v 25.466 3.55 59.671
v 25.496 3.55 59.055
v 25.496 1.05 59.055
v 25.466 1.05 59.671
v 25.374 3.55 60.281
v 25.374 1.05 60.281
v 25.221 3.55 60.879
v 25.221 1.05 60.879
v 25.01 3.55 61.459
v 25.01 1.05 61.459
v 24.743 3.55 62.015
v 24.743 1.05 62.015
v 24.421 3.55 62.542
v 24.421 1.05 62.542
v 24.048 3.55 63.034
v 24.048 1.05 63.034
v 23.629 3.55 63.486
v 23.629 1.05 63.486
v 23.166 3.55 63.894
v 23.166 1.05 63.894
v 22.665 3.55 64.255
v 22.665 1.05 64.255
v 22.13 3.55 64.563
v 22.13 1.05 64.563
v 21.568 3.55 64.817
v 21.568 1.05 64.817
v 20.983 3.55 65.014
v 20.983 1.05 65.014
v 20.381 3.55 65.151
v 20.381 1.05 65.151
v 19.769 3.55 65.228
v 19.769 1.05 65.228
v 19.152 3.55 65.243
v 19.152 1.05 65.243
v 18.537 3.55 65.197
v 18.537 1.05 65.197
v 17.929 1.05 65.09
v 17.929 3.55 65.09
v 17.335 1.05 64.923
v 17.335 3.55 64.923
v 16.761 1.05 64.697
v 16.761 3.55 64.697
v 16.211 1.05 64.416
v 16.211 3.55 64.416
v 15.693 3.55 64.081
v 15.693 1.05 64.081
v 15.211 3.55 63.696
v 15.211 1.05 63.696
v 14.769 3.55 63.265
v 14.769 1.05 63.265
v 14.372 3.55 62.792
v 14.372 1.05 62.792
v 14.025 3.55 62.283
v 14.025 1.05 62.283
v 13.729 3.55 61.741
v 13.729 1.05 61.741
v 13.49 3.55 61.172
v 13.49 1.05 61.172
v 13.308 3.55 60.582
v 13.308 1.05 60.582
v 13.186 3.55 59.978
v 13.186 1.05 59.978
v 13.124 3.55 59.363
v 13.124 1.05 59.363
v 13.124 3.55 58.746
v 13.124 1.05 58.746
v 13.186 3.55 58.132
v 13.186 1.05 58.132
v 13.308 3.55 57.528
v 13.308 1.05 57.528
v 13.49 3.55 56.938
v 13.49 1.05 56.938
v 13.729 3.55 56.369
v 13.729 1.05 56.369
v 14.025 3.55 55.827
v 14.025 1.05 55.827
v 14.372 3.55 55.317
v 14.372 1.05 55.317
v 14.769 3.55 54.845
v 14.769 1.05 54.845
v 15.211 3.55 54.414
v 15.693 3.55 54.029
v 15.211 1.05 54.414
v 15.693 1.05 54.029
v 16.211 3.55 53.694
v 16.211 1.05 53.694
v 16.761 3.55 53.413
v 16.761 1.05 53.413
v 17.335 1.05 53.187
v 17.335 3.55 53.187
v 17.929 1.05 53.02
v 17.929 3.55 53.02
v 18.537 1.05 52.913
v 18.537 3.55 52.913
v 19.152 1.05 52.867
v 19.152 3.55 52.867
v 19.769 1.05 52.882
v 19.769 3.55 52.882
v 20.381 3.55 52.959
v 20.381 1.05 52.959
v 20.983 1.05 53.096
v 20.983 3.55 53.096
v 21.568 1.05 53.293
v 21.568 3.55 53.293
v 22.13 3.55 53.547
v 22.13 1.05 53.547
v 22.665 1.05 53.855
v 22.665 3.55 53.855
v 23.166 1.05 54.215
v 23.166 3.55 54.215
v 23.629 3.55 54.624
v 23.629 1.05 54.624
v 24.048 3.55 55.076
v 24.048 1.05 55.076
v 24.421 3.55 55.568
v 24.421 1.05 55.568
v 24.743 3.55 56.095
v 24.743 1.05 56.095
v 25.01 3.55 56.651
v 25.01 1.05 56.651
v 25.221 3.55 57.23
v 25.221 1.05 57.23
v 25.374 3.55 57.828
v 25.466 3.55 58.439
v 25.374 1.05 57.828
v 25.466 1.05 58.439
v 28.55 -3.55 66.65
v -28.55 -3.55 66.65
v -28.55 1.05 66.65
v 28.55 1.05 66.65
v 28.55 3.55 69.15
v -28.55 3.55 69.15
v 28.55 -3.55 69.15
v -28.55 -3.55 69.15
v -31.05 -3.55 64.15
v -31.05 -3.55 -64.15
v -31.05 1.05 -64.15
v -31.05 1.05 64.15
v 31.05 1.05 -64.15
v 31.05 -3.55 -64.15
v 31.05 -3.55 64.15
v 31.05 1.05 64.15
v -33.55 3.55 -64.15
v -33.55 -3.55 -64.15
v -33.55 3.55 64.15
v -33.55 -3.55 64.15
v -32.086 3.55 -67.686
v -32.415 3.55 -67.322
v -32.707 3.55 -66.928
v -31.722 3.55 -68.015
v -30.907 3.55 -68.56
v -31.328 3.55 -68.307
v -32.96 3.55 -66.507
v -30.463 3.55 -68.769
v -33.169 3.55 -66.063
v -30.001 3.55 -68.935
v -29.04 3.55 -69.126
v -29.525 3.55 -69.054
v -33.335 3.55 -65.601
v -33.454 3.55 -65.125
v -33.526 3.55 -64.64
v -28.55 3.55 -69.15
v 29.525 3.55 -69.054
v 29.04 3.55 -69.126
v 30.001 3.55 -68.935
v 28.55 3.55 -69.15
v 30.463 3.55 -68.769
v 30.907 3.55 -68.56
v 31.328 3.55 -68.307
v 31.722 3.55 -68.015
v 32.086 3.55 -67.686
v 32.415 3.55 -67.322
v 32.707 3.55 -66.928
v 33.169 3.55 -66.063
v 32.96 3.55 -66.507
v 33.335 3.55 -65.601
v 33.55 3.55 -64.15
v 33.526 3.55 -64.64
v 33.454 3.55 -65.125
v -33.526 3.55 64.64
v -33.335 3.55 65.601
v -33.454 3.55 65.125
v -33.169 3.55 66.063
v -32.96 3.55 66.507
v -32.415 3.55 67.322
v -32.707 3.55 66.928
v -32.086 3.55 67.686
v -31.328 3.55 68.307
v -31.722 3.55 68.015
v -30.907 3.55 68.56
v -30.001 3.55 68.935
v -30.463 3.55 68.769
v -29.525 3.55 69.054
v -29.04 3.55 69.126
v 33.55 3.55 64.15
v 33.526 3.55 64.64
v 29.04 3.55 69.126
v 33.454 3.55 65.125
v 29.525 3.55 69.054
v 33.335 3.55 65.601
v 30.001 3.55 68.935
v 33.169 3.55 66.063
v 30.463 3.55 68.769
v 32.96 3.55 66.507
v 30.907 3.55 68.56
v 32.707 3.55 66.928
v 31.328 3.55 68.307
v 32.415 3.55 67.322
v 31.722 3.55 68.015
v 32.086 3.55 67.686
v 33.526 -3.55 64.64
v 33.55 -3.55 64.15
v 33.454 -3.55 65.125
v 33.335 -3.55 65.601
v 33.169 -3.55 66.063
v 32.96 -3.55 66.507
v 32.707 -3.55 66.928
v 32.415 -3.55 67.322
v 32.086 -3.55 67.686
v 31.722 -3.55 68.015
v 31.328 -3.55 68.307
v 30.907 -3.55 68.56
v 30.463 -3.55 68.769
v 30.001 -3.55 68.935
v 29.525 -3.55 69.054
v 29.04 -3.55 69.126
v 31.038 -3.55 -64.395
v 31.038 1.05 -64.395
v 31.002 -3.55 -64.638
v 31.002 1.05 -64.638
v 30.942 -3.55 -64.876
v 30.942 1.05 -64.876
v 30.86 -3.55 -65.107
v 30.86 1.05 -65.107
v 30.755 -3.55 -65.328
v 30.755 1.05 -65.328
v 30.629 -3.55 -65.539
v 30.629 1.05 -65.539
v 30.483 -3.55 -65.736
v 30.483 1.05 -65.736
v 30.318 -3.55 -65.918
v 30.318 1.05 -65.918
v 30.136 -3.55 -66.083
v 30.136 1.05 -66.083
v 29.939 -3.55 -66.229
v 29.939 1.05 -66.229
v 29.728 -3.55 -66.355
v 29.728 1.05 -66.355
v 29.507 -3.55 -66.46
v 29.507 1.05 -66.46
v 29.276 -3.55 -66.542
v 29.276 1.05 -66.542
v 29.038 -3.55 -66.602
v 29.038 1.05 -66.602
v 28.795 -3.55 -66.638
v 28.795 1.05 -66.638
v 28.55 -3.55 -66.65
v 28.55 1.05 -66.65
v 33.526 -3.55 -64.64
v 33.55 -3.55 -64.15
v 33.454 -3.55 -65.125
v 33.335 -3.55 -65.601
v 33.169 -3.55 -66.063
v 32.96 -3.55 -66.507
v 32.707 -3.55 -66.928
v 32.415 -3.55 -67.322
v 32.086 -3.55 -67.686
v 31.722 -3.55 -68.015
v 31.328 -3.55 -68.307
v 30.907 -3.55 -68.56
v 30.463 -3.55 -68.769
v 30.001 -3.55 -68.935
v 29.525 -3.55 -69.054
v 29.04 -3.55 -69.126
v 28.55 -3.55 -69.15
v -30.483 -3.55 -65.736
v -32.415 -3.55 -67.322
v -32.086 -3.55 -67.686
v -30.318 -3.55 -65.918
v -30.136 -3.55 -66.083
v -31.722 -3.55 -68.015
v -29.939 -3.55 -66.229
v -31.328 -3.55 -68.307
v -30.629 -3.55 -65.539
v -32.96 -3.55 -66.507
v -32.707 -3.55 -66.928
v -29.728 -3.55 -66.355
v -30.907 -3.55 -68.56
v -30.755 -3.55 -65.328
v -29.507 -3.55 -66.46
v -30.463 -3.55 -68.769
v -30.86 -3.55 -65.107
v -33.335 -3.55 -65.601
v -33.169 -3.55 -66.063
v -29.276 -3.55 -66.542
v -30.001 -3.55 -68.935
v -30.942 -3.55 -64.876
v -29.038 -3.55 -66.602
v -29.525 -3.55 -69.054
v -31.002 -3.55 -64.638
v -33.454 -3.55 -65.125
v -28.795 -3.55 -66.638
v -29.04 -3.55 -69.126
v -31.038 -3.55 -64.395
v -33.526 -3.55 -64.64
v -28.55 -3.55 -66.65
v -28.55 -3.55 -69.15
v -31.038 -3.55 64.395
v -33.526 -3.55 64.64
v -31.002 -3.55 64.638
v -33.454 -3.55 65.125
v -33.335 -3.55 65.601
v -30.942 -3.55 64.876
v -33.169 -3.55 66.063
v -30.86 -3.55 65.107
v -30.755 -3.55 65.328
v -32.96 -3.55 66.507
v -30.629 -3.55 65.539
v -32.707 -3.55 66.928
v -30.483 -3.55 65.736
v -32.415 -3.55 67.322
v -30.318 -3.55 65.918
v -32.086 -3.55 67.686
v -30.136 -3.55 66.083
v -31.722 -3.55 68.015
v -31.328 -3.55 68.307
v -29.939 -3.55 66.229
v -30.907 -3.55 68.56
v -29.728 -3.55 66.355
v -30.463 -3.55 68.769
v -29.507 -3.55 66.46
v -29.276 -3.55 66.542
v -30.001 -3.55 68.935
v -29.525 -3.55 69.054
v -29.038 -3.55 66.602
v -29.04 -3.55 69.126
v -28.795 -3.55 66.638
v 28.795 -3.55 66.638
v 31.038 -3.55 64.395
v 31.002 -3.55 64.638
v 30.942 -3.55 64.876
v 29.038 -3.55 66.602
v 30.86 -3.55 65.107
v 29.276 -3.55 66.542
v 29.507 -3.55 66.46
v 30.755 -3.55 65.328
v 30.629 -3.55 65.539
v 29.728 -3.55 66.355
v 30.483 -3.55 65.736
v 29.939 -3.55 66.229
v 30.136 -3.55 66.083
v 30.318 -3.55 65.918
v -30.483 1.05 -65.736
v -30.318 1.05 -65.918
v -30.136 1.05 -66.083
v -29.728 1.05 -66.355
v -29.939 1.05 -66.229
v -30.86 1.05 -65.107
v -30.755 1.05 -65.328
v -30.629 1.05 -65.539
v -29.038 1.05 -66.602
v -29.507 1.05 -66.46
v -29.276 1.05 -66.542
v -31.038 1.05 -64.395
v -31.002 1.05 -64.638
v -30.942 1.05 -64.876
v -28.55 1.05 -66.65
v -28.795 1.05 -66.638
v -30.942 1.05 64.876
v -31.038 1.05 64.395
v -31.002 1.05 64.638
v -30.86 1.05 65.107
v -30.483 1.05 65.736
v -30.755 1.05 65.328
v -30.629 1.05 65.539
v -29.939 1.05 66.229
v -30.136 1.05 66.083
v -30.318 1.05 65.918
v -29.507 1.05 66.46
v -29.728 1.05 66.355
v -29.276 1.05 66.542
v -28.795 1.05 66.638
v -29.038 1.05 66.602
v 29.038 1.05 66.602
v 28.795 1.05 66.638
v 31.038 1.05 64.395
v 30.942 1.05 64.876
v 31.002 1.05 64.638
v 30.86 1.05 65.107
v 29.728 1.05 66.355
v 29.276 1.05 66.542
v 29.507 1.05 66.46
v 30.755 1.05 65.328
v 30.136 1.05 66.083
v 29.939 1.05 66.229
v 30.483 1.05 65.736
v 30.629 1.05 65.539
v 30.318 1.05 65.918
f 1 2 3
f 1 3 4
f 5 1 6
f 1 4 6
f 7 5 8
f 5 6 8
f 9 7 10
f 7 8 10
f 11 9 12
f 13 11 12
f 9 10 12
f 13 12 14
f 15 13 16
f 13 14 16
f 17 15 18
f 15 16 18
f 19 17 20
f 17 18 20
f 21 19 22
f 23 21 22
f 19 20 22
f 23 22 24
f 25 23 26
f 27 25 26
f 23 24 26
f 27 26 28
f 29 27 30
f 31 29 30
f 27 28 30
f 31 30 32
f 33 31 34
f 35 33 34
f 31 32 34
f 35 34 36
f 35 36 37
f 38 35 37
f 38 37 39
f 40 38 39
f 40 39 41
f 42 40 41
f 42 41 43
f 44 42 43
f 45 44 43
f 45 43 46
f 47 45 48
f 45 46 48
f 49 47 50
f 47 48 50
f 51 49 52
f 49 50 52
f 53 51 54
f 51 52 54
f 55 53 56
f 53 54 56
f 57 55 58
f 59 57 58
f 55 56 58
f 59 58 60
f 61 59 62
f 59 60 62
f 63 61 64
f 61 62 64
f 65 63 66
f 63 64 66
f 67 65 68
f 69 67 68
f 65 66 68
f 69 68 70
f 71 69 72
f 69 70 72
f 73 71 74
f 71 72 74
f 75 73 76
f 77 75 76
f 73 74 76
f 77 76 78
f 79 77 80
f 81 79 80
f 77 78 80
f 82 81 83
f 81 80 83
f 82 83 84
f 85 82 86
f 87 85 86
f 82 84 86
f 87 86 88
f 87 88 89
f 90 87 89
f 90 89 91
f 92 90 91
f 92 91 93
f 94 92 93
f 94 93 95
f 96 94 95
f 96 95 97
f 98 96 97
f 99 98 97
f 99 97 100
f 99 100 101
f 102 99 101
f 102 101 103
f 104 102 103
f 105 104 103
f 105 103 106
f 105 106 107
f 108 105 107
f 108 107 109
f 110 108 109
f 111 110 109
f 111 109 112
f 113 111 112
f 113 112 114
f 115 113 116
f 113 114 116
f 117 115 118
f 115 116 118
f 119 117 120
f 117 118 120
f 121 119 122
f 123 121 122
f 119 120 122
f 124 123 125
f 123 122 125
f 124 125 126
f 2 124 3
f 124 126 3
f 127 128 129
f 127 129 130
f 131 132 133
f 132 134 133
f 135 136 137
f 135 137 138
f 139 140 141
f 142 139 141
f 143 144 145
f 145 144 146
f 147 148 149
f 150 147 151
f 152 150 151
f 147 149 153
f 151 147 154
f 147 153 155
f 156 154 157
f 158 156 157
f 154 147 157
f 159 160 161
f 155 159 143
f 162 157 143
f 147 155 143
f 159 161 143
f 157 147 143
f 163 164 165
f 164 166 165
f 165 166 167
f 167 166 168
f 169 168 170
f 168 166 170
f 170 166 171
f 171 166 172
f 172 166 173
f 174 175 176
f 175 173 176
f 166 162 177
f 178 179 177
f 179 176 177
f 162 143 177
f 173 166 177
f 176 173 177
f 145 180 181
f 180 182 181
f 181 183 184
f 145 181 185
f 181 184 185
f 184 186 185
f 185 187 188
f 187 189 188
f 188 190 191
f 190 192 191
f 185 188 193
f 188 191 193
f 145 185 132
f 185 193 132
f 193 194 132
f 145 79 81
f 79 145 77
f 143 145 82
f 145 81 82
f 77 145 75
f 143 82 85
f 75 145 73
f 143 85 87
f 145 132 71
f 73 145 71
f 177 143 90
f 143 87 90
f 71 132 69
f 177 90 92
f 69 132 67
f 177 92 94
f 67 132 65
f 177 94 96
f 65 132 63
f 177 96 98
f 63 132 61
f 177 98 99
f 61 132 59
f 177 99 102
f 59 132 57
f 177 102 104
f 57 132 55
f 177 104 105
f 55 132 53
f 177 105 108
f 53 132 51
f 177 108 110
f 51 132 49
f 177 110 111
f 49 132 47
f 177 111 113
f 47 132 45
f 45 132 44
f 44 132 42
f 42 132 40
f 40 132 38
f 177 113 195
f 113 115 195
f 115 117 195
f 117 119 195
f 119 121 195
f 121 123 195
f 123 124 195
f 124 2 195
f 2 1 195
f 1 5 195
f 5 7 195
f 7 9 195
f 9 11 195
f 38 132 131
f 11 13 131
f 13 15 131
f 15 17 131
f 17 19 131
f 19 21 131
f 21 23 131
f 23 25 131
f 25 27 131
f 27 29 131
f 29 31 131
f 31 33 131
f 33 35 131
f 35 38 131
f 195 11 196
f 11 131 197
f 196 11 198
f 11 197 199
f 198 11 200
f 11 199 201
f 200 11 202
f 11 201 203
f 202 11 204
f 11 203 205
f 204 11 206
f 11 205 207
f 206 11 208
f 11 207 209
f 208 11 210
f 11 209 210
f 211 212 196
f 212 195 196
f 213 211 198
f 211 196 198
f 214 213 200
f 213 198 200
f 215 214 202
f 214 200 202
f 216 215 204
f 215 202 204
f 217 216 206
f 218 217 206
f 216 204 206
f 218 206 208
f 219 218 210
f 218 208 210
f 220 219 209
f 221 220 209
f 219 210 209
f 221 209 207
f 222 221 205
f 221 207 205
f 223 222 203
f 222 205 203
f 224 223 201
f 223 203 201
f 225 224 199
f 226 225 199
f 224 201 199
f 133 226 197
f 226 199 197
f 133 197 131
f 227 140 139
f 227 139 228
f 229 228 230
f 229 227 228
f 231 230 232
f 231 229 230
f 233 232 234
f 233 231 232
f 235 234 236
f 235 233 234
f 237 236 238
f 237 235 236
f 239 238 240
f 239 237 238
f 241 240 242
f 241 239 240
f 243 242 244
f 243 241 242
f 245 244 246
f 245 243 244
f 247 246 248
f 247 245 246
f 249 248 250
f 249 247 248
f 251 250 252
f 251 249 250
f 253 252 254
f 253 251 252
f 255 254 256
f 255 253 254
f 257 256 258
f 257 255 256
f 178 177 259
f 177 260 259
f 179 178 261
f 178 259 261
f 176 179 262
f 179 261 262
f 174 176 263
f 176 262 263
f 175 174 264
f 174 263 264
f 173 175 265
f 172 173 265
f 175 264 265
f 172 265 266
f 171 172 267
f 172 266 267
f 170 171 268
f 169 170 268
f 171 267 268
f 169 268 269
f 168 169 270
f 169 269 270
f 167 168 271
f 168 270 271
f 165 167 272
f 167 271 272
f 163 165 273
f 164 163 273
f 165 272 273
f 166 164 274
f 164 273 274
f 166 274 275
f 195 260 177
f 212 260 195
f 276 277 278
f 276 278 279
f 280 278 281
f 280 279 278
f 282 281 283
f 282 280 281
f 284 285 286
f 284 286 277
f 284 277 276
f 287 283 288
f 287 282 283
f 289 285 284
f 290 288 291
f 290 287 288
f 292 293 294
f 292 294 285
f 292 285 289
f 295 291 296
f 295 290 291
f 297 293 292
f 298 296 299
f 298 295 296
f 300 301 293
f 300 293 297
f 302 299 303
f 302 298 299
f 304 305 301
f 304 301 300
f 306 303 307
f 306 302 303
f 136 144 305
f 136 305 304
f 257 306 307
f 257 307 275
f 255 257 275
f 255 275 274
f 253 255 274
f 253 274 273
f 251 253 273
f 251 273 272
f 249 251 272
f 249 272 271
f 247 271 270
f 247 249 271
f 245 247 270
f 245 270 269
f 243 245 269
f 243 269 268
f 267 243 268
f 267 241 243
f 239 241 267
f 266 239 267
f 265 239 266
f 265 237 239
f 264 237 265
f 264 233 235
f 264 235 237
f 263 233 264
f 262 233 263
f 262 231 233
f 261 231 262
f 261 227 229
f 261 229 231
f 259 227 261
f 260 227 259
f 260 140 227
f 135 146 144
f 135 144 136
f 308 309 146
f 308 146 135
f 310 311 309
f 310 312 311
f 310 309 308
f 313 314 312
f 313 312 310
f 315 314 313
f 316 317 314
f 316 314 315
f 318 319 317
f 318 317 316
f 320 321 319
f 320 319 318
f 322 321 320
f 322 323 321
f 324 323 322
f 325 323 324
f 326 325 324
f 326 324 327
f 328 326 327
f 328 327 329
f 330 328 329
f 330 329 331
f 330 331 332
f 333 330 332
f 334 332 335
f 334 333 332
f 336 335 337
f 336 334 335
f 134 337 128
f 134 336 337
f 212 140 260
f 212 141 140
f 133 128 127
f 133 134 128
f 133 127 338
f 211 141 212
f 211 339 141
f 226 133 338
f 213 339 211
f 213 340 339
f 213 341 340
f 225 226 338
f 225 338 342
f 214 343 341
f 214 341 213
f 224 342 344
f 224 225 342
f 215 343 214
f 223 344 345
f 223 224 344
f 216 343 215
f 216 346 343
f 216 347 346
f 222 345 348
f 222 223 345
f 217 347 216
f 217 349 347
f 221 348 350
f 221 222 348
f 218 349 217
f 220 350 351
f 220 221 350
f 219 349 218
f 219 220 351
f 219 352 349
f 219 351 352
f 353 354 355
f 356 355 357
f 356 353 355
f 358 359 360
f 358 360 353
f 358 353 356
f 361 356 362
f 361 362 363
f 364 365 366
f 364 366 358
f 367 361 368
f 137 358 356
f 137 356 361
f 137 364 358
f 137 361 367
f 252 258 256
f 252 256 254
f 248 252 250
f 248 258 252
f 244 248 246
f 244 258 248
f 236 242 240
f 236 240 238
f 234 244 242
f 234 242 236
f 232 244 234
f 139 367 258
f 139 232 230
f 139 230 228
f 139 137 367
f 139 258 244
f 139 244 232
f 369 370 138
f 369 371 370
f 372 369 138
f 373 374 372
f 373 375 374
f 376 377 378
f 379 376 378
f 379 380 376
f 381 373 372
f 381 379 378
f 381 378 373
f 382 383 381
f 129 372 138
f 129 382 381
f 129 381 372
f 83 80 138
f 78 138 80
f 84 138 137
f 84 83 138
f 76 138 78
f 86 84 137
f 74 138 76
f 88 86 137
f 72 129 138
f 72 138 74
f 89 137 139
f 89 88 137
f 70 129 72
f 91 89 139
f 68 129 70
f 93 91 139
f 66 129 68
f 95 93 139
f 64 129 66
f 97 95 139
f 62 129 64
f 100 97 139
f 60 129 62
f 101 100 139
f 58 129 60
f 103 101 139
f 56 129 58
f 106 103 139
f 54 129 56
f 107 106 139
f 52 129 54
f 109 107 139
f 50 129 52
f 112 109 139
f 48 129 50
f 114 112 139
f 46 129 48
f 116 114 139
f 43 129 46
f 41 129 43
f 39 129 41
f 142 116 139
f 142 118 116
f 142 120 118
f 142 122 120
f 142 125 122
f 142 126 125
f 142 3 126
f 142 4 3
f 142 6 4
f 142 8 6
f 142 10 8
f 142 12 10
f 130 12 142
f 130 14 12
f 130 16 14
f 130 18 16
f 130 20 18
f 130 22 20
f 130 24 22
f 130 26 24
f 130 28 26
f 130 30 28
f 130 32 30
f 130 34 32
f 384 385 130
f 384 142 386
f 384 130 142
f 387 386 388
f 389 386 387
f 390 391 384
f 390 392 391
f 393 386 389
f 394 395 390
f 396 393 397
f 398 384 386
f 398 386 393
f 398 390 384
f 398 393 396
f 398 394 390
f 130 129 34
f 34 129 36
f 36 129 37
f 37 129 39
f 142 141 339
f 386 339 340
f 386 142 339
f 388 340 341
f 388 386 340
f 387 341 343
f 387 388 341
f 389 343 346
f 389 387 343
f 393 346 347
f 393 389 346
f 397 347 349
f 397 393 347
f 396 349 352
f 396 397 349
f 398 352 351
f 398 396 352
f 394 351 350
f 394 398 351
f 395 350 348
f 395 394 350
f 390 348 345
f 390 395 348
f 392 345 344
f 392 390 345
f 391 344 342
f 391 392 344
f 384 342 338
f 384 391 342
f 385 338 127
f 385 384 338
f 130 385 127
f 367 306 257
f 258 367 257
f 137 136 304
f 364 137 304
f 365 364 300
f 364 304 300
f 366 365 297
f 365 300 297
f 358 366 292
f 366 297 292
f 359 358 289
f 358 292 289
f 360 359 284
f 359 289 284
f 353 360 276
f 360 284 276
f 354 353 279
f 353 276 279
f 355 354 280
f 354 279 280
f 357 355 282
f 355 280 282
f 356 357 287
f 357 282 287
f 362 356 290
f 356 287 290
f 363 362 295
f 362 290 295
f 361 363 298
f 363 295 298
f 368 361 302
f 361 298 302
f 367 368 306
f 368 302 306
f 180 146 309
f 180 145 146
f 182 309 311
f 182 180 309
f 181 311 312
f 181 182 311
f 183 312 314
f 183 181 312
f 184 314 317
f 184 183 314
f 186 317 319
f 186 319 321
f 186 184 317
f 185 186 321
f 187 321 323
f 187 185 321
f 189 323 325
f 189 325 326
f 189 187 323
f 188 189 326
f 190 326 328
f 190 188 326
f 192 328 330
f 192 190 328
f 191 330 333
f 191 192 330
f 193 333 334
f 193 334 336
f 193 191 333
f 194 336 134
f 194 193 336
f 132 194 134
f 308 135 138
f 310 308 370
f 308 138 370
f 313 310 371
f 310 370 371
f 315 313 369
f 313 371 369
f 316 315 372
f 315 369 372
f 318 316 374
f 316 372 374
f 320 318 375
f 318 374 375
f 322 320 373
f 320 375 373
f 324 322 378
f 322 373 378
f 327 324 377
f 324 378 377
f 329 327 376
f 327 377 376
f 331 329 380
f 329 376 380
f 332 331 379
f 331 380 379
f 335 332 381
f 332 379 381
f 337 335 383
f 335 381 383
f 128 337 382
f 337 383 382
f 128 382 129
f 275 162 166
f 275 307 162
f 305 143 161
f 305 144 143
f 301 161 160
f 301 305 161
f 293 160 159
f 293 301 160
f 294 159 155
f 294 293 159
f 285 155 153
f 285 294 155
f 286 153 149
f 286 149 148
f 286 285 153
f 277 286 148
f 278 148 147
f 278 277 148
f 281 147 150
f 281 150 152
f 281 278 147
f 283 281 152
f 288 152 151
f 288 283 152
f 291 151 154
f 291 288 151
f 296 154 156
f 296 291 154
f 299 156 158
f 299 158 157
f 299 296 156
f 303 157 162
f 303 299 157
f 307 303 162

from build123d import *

# Parameters (mm, degrees)
F0_W     = 67.1
F0_H     = 138.3
F1_DEPTH = 3.55
F2_R     = 5
F3_T     = -2.5
F4_R     = 6.1900061573
F5_DEPTH = 12.5


with BuildPart() as f1:
    # F0 (on Front) → F1 (new body, symmetric)
    with BuildSketch(Plane.XZ):
        Rectangle(F0_W, F0_H)
    extrude(amount=F1_DEPTH, both=True)

    # F2
    f2_edges = [f1.edges().sort_by_distance(p)[0] for p in [
        (-33.55, 0, 69.15),
        (33.55, 0, 69.15),
        (33.55, 0, -69.15),
        (-33.55, 0, -69.15),
    ]]
    fillet(f2_edges, radius=F2_R)

    # F3
    f3_openings = [f1.faces().sort_by_distance(p)[0] for p in [
        (0, -3.55, 0),
    ]]
    offset(amount=F3_T, openings=f3_openings)

    # F4 (on Front) → F5 (cut, symmetric)
    with BuildSketch(Plane.XZ):
        with Locations((19.3064566702, 59.0549409389)):
            Circle(F4_R)
    extrude(amount=F5_DEPTH, both=True, mode=Mode.SUBTRACT)


solid = f1.part
